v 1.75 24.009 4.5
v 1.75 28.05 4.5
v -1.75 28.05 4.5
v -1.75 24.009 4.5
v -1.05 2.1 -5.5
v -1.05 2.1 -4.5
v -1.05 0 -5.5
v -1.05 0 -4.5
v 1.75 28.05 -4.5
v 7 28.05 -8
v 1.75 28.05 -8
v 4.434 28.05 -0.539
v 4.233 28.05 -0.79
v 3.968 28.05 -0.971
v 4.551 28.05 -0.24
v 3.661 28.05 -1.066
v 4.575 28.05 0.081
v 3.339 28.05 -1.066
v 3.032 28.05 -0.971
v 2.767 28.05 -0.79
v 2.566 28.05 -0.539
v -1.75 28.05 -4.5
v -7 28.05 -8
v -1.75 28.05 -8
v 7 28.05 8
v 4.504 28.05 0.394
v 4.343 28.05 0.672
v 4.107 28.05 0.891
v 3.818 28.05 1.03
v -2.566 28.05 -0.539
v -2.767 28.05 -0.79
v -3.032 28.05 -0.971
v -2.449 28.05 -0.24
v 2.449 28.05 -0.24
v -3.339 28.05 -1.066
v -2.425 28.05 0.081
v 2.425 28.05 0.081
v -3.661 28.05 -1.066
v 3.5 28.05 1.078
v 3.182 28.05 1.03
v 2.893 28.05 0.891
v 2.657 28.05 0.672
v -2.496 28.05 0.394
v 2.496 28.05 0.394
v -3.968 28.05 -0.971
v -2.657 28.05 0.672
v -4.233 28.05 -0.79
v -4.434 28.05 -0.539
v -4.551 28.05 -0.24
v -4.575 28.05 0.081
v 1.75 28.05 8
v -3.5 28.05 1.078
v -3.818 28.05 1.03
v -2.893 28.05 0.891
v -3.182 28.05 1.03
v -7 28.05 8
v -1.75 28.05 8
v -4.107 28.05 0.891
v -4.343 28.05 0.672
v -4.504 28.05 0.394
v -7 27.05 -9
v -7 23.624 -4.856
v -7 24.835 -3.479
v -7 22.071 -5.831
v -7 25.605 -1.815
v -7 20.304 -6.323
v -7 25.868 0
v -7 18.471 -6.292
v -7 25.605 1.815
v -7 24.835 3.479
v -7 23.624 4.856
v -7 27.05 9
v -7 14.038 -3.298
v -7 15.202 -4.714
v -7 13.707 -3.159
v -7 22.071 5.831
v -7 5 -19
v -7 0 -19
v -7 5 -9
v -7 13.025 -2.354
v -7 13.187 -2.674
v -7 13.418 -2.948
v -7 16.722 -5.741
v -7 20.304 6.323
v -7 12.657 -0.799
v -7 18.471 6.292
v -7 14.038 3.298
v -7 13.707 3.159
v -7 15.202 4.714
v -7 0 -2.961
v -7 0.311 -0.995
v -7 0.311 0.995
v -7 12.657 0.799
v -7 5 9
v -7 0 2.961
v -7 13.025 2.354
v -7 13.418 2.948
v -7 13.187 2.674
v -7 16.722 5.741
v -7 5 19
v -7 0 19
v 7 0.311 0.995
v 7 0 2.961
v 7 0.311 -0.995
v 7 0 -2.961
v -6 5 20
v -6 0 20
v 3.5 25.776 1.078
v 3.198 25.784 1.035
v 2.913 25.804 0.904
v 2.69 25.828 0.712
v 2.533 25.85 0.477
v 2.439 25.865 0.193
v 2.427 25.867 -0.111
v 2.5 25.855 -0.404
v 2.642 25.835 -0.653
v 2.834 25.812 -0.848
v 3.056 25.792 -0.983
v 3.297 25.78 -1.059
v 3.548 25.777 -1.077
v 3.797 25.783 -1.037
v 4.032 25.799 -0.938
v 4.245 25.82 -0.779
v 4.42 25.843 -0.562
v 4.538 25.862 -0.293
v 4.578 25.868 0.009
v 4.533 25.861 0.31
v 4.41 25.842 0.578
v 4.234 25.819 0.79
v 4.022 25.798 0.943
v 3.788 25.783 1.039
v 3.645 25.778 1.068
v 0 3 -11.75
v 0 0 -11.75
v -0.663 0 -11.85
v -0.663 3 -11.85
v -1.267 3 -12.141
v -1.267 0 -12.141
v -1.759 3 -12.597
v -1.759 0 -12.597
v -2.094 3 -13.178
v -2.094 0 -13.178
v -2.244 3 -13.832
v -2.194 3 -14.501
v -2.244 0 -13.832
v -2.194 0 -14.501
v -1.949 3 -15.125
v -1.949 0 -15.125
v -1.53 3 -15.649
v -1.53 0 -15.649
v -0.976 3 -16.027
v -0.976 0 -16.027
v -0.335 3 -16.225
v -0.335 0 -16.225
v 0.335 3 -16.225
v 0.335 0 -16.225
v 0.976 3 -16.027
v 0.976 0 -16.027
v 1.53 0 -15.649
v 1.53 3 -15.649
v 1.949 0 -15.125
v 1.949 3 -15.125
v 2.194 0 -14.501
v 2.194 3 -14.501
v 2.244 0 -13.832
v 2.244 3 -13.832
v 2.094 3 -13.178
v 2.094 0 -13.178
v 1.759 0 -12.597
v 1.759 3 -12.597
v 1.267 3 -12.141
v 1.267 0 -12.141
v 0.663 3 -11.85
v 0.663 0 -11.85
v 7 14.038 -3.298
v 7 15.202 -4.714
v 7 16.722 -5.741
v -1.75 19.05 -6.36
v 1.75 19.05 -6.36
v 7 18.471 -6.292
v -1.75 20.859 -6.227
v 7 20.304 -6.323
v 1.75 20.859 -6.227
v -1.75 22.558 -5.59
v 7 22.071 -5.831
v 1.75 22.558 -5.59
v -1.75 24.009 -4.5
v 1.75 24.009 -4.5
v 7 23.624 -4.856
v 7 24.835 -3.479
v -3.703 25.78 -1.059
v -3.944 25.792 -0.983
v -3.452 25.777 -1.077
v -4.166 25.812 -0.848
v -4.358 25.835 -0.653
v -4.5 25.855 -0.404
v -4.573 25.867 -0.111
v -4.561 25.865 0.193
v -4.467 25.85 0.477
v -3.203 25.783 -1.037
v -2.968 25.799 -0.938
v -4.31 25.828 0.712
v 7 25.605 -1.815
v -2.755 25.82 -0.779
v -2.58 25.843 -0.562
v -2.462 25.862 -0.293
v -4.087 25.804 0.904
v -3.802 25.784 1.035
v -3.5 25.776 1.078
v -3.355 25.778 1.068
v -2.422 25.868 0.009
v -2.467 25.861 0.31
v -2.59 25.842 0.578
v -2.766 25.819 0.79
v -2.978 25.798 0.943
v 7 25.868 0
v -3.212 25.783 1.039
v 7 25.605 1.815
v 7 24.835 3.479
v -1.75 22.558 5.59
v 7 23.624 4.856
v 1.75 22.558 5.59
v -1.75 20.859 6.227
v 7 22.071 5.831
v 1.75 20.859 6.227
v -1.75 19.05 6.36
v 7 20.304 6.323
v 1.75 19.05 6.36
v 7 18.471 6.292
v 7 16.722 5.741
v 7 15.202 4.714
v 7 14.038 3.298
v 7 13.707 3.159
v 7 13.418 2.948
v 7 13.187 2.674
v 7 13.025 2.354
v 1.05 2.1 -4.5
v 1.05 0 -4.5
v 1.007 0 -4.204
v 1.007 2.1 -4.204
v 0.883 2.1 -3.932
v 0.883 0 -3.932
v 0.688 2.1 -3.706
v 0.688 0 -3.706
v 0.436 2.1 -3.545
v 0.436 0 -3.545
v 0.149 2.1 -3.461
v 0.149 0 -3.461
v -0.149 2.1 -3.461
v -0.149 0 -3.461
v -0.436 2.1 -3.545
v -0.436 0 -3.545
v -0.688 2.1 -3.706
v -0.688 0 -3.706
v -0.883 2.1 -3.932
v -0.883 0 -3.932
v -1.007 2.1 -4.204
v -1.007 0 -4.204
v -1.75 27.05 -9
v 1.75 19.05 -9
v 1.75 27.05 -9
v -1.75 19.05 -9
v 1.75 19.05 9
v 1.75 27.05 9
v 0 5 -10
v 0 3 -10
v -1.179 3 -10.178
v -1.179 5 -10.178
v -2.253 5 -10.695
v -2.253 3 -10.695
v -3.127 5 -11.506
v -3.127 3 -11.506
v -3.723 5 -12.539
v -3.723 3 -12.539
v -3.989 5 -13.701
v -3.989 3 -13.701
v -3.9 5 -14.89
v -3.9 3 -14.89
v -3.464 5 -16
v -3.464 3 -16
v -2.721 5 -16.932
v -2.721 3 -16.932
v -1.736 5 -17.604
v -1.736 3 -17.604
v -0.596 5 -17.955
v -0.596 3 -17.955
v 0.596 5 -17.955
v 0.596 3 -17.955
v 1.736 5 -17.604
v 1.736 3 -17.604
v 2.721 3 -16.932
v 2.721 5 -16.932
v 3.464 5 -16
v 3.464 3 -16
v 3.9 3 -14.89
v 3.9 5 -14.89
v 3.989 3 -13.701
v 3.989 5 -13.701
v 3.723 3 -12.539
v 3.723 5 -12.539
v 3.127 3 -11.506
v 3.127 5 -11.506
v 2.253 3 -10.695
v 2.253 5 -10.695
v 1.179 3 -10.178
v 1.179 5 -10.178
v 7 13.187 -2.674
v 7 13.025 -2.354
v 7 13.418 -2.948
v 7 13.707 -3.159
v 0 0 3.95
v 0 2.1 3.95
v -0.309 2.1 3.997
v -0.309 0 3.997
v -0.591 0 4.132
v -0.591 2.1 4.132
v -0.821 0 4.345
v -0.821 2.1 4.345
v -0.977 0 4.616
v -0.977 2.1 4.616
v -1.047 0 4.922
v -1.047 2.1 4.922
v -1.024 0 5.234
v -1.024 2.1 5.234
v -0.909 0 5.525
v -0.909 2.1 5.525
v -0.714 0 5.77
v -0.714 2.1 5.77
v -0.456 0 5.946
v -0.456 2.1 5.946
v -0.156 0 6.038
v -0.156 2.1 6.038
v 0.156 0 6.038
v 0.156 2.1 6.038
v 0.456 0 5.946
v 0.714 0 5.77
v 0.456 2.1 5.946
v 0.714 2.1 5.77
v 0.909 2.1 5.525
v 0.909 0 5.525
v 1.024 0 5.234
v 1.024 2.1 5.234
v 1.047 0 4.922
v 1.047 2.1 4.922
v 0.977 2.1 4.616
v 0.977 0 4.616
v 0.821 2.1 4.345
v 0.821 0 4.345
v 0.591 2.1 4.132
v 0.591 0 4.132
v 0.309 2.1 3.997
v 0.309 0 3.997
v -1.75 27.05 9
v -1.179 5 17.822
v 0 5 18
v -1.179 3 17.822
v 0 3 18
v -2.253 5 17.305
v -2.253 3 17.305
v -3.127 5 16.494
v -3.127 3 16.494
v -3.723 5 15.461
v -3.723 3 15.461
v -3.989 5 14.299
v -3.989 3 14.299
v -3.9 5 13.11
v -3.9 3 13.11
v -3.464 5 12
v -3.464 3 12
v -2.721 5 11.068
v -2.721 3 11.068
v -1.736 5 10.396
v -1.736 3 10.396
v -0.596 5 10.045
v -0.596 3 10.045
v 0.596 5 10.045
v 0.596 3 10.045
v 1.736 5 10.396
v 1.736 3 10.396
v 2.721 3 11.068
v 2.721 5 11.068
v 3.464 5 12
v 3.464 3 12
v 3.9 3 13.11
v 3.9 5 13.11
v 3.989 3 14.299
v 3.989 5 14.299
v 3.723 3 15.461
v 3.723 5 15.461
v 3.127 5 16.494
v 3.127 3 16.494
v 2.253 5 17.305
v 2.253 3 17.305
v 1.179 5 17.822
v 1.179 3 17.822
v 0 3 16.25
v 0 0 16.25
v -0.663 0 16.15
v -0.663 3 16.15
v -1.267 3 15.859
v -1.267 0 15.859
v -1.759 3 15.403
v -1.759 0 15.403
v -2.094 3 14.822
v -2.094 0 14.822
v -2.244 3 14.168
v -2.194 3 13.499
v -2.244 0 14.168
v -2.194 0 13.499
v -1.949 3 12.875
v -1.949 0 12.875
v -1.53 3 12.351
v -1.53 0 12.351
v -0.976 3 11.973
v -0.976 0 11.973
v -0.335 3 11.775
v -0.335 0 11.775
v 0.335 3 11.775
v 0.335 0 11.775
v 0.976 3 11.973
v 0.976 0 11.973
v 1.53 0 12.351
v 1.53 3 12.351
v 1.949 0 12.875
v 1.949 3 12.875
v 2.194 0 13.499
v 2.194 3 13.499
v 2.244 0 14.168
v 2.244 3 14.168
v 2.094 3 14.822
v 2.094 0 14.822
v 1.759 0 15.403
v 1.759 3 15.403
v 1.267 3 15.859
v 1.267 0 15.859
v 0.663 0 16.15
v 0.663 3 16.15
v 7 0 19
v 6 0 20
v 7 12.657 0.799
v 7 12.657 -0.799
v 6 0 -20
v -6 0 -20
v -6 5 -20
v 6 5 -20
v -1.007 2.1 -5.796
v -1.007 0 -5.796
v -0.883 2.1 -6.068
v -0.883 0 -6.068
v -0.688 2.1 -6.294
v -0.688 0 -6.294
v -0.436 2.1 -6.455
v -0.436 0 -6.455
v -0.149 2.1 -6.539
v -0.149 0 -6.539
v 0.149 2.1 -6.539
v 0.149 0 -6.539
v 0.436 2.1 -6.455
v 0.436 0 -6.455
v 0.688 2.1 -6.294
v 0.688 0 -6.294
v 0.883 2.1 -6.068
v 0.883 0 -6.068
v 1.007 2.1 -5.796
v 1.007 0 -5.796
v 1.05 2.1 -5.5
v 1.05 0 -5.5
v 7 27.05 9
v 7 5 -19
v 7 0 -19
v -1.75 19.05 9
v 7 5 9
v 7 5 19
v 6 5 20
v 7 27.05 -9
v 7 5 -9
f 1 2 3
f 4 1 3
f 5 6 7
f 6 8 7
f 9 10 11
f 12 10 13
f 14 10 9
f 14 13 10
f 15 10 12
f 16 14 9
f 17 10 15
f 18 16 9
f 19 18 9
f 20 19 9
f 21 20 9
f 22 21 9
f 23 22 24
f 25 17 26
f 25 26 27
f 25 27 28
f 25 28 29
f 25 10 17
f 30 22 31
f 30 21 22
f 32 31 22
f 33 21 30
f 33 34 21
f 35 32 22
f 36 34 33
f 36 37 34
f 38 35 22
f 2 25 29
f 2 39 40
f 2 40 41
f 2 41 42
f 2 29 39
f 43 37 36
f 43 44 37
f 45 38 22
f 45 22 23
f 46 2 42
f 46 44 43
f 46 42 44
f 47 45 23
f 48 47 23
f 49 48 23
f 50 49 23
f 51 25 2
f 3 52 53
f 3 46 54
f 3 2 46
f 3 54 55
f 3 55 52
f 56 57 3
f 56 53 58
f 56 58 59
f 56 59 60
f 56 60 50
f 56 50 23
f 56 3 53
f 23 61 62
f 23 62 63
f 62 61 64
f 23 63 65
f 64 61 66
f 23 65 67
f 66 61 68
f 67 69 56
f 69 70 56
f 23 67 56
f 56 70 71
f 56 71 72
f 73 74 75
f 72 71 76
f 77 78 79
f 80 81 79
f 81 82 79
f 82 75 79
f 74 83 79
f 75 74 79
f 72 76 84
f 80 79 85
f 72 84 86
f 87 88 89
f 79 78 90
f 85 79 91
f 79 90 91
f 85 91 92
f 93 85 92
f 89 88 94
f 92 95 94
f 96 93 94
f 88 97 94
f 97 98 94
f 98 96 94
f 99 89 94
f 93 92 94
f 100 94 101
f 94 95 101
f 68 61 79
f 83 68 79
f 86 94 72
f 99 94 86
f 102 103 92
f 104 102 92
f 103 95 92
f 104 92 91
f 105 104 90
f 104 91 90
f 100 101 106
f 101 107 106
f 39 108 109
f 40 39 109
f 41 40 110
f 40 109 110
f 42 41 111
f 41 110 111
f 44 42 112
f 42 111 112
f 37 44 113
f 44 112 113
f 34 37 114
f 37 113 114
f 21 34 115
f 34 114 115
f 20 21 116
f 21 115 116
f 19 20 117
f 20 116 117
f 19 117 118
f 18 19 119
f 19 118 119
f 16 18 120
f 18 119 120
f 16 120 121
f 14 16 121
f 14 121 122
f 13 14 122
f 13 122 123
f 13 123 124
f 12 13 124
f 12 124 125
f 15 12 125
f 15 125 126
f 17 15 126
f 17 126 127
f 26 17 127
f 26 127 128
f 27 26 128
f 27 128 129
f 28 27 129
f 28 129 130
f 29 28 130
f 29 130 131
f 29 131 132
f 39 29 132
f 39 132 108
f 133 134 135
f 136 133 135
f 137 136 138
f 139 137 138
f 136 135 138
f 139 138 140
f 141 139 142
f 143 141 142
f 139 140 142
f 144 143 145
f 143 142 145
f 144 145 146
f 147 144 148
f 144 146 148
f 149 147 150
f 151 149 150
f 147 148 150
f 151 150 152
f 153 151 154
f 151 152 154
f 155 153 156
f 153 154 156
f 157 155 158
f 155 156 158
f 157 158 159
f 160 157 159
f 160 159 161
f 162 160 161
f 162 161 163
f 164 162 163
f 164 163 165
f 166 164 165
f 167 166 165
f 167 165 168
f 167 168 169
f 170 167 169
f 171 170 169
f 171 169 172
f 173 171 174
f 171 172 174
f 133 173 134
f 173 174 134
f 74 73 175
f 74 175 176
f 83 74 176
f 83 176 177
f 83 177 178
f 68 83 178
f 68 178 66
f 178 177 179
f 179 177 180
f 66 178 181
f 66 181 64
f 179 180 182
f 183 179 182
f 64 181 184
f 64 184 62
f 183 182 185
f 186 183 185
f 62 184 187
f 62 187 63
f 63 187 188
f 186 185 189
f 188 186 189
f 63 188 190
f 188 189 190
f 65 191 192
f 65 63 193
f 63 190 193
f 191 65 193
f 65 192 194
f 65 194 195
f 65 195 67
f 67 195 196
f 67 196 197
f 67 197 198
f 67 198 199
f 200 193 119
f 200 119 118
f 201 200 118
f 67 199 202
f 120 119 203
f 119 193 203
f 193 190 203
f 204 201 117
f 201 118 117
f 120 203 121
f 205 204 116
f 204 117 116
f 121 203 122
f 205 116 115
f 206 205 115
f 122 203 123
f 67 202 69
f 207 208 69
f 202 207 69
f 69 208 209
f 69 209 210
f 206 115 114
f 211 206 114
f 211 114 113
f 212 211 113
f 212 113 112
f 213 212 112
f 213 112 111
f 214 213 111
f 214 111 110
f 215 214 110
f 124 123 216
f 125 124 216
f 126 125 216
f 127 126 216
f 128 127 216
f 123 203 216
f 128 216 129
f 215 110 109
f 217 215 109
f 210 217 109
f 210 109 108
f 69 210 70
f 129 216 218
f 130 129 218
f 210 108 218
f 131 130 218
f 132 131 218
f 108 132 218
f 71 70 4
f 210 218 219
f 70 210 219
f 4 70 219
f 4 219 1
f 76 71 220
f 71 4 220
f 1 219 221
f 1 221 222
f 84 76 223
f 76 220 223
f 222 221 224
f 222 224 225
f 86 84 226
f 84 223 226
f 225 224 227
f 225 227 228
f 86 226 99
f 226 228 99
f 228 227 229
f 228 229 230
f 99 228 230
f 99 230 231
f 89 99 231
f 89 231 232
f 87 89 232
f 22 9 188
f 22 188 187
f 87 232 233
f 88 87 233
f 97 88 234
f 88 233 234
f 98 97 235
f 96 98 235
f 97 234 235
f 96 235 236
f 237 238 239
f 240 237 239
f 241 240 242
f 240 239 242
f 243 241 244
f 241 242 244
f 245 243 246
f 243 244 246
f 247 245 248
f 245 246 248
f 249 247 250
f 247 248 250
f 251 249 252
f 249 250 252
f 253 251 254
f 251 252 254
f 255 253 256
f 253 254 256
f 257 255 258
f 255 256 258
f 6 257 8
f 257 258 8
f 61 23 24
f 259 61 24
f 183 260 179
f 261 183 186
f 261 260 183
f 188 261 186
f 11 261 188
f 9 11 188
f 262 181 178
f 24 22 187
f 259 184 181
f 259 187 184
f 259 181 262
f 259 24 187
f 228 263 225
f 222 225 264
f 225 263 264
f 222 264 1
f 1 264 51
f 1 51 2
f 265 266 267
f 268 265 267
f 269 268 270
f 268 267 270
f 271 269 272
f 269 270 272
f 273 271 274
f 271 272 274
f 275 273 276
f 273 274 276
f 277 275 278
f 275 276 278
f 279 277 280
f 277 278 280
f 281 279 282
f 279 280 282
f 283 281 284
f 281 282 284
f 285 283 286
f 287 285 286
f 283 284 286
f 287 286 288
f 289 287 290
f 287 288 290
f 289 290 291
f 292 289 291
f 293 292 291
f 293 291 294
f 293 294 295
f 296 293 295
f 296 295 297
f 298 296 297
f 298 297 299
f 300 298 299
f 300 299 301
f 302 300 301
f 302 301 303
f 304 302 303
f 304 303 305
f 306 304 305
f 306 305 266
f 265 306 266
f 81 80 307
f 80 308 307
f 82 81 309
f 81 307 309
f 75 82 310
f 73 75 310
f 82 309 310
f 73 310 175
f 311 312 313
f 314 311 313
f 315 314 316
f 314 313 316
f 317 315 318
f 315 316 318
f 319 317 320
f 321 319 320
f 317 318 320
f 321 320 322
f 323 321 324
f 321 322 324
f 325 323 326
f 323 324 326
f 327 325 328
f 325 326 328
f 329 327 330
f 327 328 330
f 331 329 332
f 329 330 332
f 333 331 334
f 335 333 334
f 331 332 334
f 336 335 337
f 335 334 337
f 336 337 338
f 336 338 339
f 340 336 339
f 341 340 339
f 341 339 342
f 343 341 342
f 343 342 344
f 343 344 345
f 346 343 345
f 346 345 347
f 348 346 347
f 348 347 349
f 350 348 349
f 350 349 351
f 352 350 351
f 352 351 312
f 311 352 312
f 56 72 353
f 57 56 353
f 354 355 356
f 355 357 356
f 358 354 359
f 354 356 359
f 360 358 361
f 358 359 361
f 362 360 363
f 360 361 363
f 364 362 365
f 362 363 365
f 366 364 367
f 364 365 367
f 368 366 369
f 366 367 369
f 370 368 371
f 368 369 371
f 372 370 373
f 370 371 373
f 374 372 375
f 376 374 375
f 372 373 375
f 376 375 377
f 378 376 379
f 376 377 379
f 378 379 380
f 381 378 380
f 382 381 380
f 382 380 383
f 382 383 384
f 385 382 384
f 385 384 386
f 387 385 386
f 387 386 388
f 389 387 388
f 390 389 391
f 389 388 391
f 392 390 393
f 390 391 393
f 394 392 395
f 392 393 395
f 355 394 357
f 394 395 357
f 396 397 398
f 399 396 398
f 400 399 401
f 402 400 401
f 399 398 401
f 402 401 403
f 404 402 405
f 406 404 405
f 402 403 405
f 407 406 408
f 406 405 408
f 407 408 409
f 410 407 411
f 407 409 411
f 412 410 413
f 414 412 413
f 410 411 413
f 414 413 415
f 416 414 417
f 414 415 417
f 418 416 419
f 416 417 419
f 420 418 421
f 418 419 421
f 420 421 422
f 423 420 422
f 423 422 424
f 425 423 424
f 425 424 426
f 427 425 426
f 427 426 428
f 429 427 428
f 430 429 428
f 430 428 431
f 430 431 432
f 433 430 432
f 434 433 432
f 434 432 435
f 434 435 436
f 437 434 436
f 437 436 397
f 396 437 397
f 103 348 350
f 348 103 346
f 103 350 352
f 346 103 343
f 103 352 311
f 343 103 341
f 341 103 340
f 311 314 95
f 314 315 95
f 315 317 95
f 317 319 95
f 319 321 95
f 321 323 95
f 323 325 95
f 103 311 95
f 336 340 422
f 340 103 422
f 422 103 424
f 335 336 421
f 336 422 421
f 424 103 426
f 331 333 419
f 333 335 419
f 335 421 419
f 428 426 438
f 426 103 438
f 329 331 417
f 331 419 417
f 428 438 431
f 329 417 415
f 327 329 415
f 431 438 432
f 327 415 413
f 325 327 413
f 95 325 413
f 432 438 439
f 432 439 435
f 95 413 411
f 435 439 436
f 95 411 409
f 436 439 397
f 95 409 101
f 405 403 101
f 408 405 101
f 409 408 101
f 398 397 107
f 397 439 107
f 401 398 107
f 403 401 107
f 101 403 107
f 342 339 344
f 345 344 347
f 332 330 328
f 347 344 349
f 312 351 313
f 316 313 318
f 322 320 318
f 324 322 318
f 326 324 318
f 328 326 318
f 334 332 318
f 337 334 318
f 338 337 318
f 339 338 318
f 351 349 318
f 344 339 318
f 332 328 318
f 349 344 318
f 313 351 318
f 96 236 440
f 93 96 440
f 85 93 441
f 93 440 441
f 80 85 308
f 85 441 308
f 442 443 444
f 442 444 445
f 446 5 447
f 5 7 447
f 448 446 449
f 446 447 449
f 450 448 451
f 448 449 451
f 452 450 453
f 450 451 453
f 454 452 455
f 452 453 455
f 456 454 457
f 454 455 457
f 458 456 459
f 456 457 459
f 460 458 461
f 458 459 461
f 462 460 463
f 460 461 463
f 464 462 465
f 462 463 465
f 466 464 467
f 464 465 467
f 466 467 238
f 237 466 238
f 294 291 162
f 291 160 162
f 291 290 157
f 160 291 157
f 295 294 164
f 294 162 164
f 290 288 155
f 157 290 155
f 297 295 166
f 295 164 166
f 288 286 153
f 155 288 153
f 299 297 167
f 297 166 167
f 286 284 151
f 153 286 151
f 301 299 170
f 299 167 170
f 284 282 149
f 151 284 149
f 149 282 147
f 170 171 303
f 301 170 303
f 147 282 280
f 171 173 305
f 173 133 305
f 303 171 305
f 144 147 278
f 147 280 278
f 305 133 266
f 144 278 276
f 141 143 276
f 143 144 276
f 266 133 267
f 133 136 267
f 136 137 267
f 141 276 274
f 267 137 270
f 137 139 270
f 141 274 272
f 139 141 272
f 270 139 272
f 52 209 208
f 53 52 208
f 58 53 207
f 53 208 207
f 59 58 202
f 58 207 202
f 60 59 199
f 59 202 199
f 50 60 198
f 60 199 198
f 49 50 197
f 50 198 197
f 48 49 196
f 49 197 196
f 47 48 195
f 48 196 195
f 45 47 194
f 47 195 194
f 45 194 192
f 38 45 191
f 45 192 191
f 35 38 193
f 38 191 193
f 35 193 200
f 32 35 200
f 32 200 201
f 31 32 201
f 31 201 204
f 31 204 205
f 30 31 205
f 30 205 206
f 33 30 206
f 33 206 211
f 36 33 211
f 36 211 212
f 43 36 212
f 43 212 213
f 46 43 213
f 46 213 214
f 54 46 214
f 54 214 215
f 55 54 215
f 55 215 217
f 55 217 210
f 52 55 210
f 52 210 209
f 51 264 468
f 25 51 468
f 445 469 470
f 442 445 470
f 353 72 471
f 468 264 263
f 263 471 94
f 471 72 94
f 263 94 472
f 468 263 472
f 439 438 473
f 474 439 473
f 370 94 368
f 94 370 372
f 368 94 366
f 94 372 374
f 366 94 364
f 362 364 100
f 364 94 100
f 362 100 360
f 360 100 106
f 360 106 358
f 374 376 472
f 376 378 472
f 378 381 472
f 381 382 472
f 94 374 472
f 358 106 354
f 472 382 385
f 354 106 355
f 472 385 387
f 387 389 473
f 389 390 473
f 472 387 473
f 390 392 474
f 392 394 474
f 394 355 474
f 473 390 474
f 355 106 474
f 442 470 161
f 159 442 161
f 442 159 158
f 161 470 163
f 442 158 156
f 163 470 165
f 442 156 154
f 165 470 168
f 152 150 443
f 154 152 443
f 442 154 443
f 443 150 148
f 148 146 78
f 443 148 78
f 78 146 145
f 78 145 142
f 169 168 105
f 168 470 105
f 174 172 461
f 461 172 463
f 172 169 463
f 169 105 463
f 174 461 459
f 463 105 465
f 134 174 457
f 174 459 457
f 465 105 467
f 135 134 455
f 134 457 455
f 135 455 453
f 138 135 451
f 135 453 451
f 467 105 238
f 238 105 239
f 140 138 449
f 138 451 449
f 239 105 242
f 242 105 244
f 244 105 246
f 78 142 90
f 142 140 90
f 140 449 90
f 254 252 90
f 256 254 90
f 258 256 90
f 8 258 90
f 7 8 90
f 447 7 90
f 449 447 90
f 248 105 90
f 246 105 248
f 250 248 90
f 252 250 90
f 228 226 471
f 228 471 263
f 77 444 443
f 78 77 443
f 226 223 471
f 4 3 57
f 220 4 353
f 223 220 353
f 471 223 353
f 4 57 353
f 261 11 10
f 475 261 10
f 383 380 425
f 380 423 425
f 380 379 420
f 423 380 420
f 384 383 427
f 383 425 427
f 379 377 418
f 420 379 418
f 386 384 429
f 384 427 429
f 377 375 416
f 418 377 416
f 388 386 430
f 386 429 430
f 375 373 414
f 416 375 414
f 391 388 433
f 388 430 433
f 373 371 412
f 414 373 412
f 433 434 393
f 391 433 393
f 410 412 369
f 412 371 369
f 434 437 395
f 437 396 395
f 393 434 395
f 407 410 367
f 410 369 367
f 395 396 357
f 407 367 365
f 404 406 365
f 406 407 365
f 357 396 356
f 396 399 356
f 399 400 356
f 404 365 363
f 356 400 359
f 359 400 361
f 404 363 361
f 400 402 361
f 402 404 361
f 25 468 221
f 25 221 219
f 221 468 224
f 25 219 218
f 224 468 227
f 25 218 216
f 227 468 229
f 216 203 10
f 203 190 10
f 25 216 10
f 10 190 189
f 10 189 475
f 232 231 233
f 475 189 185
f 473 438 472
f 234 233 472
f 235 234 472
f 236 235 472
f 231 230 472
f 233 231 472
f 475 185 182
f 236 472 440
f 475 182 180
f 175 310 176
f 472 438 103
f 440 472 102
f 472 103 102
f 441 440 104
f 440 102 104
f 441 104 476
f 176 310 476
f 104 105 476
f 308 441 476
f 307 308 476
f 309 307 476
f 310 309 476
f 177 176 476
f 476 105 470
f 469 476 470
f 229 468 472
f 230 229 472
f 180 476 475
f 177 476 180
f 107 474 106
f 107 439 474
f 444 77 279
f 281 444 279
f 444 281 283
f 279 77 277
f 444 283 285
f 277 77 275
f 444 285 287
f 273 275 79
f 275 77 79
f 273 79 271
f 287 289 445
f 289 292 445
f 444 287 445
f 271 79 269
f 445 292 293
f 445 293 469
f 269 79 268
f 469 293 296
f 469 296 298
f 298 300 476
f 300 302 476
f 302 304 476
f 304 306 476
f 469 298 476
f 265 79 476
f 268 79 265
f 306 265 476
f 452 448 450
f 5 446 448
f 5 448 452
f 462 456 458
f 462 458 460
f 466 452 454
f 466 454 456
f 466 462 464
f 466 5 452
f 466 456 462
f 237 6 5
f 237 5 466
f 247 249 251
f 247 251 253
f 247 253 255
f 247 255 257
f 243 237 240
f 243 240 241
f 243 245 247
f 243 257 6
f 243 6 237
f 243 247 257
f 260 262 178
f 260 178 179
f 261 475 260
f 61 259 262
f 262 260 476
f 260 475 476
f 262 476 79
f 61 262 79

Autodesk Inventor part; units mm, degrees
ref_plane "YZ Plane" through (0, 0, 0) normal (1, 0, 0) x (0, 1, 0)
ref_plane "XZ Plane" through (0, 0, 0) normal (0, 1, 0) x (-1, 0, 0)
ref_plane "XY Plane" through (0, 0, 0) normal (0, 0, 1) x (1, 0, 0)
sketch "Sketch1" plane through (0, 0, 0) normal (0, 1, 0) x (-1, 0, 0)
  line L0 (7, 9) -> (-7, 9)
  line L1 (-7, 9) -> (-7, -9)
  line L2 (-7, -9) -> (7, -9)
  line L3 (7, -9) -> (7, 9)
  line L4 (7, 9) -> (-7, -9) construction
  line L5 (-7, 9) -> (7, -9) construction
  point P0 (0, 0)
  dimension "POST_WIDTH" = 18
  dimension "POST_LENGTH" = 14
extrude "Extrusion1" add sketch "Sketch1" along normal blind 28.05
sketch "Sketch2" plane through (0, 0, 0) normal (0, -1, 0) x (1, 0, 0)
  line L0 (-7, -20) -> (7, -20)
  line L1 (7, -20) -> (7, 20)
  line L2 (7, 20) -> (-7, 20)
  line L3 (-7, 20) -> (-7, -20)
  line L4 (-7, -20) -> (7, 20) construction
  line L5 (7, -20) -> (-7, 20) construction
  line L6 (-7, -9) -> (-7, 9) projected
  line L7 (-7, 9) -> (7, 9) projected
  point P0 (0, 0)
  dimension "d4" = 0
  dimension "d5" = 11
extrude "Extrusion2" add sketch "Sketch2" against normal blind 5
sketch "Sketch3" plane through (0, 5, 0) normal (0, 1, 0) x (1, 0, 0)
  line L0 (-7, 20) -> (7, 20) projected
  line L1 (0, 20) -> (0, -20)
  line L2 (7, -20) -> (-7, -20) projected
  line L3 (7, -9) -> (7, 9) projected
  line L4 (7, 0) -> (-7, 0)
  line L5 (-7, 20) -> (-7, -20) projected
  point P0 (0, 0)
  point P1 (0, -14)
  point P2 (0, 14)
  dimension "d15" = 0
  dimension "d16" = 6
hole "Hole1" at (0, 5, 14) at (0, 5, -14) direction (0, -1, 0) diameter 4.5 end through all counterbore diameter 8 counterbore depth 2 clearance for "Socket Head Cap Screw" size "#8" standard "Ansi Unified Screw Threads"
chamfer "Chamfer2" distance 1 angle 45 2 edges at (0, 28.05, 9) (0, 28.05, -9)
sketch "Sketch8" plane through (7, 5, -9) normal (1, 0, 0) x (0, 0, -1)
  circle A0 centre (-9, 14.4933) radius 6.375
  circle A1 centre (-9, 14.4933) radius 6.883
  circle A2 centre (-10.8329, 9.4575) radius 1.524
  line L0 (-9, 14.4933) -> (-9, 7.6103)
  circle A3 centre (-7.1671, 9.4575) radius 1.524
  line L1 (-9, 14.4933) -> (-10.8329, 9.4575)
  line L2 (-18, 0) -> (-18, 22.05) projected
  line L3 (-17, 23.05) -> (-1, 23.05) projected
  circle A4 centre (-9, 14.05) radius 6
  line L4 (11, -5) -> (-29, -5) projected
  point P0 (-9, -5)
  point P1 (-6.6459, 8.0254)
  point P2 (-8.0195, 8.1942)
  point P3 (-12.2979, 9.0376)
  point P4 (-11.3541, 8.0254)
  point P5 (-5.7021, 9.0376)
  point P6 (-9.9805, 8.1942)
  dimension "d95" = 12
  dimension "HOLE_SIZE" = 12.75
  dimension "THREE_POINT_SIZE" = 13.766
  dimension "d51" = 3.048
  dimension "d52" = 20
  dimension "d55" = 9
  dimension "d96" = 19.05
extrude "Extrusion6" cut sketch "Sketch8" against normal up to surface (14 mm away) contours A0 A4 | A2 A0 | A4 A3 A0 L0 L1 A2 | A4 A2 | A0 A2 A4 | A4 A3 A0 | A0 A3 | A3 A4 | A2 L1 L0 A0 | A0 L0 A4 A2 | A2 A4 L0 A1 | A3 A4 L0 A0 | A1 L0 A4 A3
sketch "Sketch9" plane through (0, 28.05, 0) normal (0, 1, 0) x (1, 0, 0)
  line L0 (-7, 8) -> (-7, -8) projected
  line L1 (-7, -9) -> (7, -9) projected
  line L2 (7, -8) -> (7, 8) projected
  point P0 (0, 0)
  point P1 (-3.5, 0)
  point P2 (3.5, 0)
  dimension "d64" = 3.5
  dimension "d65" = 9
  dimension "d94" = 3.5
hole "Hole3" at (-3.5, 28.05, 0) at (3.5, 28.05, 0) direction (0, -1, 0) diameter 2.1565 end up to surface thread size "4-40 UNC" class "2B" standard "ANSI Unified Screw Threads"
chamfer "Chamfer3" distance 1 angle 45 4 edges at (7, 2.5, 20) (-7, 2.5, 20) (7, 2.5, -20) (-7, 2.5, -20)
sketch "Sketch10" plane through (0, 28.05, 0) normal (0, 1, 0) x (1, 0, 0)
  line L0 (-7, -9) -> (7, -9) projected
  line L1 (-1.75, -9) -> (1.75, -9)
  line L2 (1.75, -9) -> (1.75, -4.5)
  line L3 (1.75, -4.5) -> (-1.75, -4.5)
  line L4 (-1.75, -4.5) -> (-1.75, -9)
  line L5 (7, 9) -> (-7, 9) projected
  line L6 (-9.8, 0) -> (9.8, 0) projected
  line L7 (-1.75, 9) -> (1.75, 9)
  line L8 (1.75, 9) -> (1.75, 4.5)
  line L9 (1.75, 4.5) -> (-1.75, 4.5)
  line L10 (-1.75, 4.5) -> (-1.75, 9)
  point P0 (0, 0)
  point P1 (1.75, 5.6664)
  point P2 (1.75, 9)
  dimension "d71" = 4.5
  dimension "d72" = 3.5
  dimension "d73" = 1.75
extrude "Extrusion7" cut sketch "Sketch10" against normal blind 9
sketch "Sketch11" plane through (0, 0, 0) normal (0, -1, 0) x (1, 0, 0)
  line L0 (0, -4.5) -> (0, -5.5) construction
  line L1 (-1.05, -4.5) -> (-1.05, -5.5)
  line L2 (1.05, -5.5) -> (1.05, -4.5)
  arc A0 (1.05, -4.5) -> (-1.05, -4.5) centre (0, -4.5) ccw
  arc A1 (-1.05, -5.5) -> (1.05, -5.5) centre (0, -5.5) ccw
  point P0 (0, 0)
  point P1 (0, 5)
  point P2 (0, -5)
  dimension "d74" = 10
  dimension "d75" = 0
  dimension "d76" = 0
  dimension "d77" = 5
  dimension "d78" = 1.05
  dimension "d79" = 1
hole "Hole4" at (0, 0, 5) direction (0, 1, 0) diameter 2.1 depth 2.1
extrude "Extrusion8" cut sketch "Sketch11" against normal blind 2.1
sketch "Sketch12" plane through (-7, 5, 9) normal (-1, 0, 0) x (0, 0, 1)
  circle A0 centre (-9, -17.35) radius 12.7
  point P0 (-9, -5)
  dimension "d89" = 0
  dimension "d90" = 12.35
  dimension "d91" = 25.4
extrude "Extrusion9" cut sketch "Sketch12" against normal up to surface (14 mm away)
equation "\"HOLE_SIZE\" = 2 * HOLE_RADIUS + HOLE_TOLERANCE"
equation "\"d52\" = 0.5 * THREE_POINT_ANGLE"
equation "\"d55\" = 0.5 * POST_WIDTH"
equation "\"d96\" = BEAM_HEIGHT"
equation "\"d64\" = 0.25 * POST_LENGTH"
equation "\"d65\" = 0.5 * POST_WIDTH"
equation "\"d94\" = d64"
equation "\"d71\" = 0.25 * POST_WIDTH"
equation "\"d72\" = 0.25 * POST_LENGTH"
equation "\"d73\" = 0.125 * POST_LENGTH"
equation "\"d69\" = EDGE_TO_HOLE"
equation "\"EDGE_TO_HOLE\" = POST_HEIGHT - BEAM_HEIGHT"
equation "\"BEAM_HEIGHT\" = 19.05"
equation "\"COLLIMATOR_DIAMETER\" = 12"
equation "\"THREE_POINT_ANGLE\" = 40deg"
equation "\"HOLE_RADIUS\" = 6.35"
equation "\"HOLE_TOLERANCE\" = 0.05"
equation "\"POST_HEIGHT\" = 28.05"
properties part number "ADAPTER_collimator-BH19.05-D12.7"
